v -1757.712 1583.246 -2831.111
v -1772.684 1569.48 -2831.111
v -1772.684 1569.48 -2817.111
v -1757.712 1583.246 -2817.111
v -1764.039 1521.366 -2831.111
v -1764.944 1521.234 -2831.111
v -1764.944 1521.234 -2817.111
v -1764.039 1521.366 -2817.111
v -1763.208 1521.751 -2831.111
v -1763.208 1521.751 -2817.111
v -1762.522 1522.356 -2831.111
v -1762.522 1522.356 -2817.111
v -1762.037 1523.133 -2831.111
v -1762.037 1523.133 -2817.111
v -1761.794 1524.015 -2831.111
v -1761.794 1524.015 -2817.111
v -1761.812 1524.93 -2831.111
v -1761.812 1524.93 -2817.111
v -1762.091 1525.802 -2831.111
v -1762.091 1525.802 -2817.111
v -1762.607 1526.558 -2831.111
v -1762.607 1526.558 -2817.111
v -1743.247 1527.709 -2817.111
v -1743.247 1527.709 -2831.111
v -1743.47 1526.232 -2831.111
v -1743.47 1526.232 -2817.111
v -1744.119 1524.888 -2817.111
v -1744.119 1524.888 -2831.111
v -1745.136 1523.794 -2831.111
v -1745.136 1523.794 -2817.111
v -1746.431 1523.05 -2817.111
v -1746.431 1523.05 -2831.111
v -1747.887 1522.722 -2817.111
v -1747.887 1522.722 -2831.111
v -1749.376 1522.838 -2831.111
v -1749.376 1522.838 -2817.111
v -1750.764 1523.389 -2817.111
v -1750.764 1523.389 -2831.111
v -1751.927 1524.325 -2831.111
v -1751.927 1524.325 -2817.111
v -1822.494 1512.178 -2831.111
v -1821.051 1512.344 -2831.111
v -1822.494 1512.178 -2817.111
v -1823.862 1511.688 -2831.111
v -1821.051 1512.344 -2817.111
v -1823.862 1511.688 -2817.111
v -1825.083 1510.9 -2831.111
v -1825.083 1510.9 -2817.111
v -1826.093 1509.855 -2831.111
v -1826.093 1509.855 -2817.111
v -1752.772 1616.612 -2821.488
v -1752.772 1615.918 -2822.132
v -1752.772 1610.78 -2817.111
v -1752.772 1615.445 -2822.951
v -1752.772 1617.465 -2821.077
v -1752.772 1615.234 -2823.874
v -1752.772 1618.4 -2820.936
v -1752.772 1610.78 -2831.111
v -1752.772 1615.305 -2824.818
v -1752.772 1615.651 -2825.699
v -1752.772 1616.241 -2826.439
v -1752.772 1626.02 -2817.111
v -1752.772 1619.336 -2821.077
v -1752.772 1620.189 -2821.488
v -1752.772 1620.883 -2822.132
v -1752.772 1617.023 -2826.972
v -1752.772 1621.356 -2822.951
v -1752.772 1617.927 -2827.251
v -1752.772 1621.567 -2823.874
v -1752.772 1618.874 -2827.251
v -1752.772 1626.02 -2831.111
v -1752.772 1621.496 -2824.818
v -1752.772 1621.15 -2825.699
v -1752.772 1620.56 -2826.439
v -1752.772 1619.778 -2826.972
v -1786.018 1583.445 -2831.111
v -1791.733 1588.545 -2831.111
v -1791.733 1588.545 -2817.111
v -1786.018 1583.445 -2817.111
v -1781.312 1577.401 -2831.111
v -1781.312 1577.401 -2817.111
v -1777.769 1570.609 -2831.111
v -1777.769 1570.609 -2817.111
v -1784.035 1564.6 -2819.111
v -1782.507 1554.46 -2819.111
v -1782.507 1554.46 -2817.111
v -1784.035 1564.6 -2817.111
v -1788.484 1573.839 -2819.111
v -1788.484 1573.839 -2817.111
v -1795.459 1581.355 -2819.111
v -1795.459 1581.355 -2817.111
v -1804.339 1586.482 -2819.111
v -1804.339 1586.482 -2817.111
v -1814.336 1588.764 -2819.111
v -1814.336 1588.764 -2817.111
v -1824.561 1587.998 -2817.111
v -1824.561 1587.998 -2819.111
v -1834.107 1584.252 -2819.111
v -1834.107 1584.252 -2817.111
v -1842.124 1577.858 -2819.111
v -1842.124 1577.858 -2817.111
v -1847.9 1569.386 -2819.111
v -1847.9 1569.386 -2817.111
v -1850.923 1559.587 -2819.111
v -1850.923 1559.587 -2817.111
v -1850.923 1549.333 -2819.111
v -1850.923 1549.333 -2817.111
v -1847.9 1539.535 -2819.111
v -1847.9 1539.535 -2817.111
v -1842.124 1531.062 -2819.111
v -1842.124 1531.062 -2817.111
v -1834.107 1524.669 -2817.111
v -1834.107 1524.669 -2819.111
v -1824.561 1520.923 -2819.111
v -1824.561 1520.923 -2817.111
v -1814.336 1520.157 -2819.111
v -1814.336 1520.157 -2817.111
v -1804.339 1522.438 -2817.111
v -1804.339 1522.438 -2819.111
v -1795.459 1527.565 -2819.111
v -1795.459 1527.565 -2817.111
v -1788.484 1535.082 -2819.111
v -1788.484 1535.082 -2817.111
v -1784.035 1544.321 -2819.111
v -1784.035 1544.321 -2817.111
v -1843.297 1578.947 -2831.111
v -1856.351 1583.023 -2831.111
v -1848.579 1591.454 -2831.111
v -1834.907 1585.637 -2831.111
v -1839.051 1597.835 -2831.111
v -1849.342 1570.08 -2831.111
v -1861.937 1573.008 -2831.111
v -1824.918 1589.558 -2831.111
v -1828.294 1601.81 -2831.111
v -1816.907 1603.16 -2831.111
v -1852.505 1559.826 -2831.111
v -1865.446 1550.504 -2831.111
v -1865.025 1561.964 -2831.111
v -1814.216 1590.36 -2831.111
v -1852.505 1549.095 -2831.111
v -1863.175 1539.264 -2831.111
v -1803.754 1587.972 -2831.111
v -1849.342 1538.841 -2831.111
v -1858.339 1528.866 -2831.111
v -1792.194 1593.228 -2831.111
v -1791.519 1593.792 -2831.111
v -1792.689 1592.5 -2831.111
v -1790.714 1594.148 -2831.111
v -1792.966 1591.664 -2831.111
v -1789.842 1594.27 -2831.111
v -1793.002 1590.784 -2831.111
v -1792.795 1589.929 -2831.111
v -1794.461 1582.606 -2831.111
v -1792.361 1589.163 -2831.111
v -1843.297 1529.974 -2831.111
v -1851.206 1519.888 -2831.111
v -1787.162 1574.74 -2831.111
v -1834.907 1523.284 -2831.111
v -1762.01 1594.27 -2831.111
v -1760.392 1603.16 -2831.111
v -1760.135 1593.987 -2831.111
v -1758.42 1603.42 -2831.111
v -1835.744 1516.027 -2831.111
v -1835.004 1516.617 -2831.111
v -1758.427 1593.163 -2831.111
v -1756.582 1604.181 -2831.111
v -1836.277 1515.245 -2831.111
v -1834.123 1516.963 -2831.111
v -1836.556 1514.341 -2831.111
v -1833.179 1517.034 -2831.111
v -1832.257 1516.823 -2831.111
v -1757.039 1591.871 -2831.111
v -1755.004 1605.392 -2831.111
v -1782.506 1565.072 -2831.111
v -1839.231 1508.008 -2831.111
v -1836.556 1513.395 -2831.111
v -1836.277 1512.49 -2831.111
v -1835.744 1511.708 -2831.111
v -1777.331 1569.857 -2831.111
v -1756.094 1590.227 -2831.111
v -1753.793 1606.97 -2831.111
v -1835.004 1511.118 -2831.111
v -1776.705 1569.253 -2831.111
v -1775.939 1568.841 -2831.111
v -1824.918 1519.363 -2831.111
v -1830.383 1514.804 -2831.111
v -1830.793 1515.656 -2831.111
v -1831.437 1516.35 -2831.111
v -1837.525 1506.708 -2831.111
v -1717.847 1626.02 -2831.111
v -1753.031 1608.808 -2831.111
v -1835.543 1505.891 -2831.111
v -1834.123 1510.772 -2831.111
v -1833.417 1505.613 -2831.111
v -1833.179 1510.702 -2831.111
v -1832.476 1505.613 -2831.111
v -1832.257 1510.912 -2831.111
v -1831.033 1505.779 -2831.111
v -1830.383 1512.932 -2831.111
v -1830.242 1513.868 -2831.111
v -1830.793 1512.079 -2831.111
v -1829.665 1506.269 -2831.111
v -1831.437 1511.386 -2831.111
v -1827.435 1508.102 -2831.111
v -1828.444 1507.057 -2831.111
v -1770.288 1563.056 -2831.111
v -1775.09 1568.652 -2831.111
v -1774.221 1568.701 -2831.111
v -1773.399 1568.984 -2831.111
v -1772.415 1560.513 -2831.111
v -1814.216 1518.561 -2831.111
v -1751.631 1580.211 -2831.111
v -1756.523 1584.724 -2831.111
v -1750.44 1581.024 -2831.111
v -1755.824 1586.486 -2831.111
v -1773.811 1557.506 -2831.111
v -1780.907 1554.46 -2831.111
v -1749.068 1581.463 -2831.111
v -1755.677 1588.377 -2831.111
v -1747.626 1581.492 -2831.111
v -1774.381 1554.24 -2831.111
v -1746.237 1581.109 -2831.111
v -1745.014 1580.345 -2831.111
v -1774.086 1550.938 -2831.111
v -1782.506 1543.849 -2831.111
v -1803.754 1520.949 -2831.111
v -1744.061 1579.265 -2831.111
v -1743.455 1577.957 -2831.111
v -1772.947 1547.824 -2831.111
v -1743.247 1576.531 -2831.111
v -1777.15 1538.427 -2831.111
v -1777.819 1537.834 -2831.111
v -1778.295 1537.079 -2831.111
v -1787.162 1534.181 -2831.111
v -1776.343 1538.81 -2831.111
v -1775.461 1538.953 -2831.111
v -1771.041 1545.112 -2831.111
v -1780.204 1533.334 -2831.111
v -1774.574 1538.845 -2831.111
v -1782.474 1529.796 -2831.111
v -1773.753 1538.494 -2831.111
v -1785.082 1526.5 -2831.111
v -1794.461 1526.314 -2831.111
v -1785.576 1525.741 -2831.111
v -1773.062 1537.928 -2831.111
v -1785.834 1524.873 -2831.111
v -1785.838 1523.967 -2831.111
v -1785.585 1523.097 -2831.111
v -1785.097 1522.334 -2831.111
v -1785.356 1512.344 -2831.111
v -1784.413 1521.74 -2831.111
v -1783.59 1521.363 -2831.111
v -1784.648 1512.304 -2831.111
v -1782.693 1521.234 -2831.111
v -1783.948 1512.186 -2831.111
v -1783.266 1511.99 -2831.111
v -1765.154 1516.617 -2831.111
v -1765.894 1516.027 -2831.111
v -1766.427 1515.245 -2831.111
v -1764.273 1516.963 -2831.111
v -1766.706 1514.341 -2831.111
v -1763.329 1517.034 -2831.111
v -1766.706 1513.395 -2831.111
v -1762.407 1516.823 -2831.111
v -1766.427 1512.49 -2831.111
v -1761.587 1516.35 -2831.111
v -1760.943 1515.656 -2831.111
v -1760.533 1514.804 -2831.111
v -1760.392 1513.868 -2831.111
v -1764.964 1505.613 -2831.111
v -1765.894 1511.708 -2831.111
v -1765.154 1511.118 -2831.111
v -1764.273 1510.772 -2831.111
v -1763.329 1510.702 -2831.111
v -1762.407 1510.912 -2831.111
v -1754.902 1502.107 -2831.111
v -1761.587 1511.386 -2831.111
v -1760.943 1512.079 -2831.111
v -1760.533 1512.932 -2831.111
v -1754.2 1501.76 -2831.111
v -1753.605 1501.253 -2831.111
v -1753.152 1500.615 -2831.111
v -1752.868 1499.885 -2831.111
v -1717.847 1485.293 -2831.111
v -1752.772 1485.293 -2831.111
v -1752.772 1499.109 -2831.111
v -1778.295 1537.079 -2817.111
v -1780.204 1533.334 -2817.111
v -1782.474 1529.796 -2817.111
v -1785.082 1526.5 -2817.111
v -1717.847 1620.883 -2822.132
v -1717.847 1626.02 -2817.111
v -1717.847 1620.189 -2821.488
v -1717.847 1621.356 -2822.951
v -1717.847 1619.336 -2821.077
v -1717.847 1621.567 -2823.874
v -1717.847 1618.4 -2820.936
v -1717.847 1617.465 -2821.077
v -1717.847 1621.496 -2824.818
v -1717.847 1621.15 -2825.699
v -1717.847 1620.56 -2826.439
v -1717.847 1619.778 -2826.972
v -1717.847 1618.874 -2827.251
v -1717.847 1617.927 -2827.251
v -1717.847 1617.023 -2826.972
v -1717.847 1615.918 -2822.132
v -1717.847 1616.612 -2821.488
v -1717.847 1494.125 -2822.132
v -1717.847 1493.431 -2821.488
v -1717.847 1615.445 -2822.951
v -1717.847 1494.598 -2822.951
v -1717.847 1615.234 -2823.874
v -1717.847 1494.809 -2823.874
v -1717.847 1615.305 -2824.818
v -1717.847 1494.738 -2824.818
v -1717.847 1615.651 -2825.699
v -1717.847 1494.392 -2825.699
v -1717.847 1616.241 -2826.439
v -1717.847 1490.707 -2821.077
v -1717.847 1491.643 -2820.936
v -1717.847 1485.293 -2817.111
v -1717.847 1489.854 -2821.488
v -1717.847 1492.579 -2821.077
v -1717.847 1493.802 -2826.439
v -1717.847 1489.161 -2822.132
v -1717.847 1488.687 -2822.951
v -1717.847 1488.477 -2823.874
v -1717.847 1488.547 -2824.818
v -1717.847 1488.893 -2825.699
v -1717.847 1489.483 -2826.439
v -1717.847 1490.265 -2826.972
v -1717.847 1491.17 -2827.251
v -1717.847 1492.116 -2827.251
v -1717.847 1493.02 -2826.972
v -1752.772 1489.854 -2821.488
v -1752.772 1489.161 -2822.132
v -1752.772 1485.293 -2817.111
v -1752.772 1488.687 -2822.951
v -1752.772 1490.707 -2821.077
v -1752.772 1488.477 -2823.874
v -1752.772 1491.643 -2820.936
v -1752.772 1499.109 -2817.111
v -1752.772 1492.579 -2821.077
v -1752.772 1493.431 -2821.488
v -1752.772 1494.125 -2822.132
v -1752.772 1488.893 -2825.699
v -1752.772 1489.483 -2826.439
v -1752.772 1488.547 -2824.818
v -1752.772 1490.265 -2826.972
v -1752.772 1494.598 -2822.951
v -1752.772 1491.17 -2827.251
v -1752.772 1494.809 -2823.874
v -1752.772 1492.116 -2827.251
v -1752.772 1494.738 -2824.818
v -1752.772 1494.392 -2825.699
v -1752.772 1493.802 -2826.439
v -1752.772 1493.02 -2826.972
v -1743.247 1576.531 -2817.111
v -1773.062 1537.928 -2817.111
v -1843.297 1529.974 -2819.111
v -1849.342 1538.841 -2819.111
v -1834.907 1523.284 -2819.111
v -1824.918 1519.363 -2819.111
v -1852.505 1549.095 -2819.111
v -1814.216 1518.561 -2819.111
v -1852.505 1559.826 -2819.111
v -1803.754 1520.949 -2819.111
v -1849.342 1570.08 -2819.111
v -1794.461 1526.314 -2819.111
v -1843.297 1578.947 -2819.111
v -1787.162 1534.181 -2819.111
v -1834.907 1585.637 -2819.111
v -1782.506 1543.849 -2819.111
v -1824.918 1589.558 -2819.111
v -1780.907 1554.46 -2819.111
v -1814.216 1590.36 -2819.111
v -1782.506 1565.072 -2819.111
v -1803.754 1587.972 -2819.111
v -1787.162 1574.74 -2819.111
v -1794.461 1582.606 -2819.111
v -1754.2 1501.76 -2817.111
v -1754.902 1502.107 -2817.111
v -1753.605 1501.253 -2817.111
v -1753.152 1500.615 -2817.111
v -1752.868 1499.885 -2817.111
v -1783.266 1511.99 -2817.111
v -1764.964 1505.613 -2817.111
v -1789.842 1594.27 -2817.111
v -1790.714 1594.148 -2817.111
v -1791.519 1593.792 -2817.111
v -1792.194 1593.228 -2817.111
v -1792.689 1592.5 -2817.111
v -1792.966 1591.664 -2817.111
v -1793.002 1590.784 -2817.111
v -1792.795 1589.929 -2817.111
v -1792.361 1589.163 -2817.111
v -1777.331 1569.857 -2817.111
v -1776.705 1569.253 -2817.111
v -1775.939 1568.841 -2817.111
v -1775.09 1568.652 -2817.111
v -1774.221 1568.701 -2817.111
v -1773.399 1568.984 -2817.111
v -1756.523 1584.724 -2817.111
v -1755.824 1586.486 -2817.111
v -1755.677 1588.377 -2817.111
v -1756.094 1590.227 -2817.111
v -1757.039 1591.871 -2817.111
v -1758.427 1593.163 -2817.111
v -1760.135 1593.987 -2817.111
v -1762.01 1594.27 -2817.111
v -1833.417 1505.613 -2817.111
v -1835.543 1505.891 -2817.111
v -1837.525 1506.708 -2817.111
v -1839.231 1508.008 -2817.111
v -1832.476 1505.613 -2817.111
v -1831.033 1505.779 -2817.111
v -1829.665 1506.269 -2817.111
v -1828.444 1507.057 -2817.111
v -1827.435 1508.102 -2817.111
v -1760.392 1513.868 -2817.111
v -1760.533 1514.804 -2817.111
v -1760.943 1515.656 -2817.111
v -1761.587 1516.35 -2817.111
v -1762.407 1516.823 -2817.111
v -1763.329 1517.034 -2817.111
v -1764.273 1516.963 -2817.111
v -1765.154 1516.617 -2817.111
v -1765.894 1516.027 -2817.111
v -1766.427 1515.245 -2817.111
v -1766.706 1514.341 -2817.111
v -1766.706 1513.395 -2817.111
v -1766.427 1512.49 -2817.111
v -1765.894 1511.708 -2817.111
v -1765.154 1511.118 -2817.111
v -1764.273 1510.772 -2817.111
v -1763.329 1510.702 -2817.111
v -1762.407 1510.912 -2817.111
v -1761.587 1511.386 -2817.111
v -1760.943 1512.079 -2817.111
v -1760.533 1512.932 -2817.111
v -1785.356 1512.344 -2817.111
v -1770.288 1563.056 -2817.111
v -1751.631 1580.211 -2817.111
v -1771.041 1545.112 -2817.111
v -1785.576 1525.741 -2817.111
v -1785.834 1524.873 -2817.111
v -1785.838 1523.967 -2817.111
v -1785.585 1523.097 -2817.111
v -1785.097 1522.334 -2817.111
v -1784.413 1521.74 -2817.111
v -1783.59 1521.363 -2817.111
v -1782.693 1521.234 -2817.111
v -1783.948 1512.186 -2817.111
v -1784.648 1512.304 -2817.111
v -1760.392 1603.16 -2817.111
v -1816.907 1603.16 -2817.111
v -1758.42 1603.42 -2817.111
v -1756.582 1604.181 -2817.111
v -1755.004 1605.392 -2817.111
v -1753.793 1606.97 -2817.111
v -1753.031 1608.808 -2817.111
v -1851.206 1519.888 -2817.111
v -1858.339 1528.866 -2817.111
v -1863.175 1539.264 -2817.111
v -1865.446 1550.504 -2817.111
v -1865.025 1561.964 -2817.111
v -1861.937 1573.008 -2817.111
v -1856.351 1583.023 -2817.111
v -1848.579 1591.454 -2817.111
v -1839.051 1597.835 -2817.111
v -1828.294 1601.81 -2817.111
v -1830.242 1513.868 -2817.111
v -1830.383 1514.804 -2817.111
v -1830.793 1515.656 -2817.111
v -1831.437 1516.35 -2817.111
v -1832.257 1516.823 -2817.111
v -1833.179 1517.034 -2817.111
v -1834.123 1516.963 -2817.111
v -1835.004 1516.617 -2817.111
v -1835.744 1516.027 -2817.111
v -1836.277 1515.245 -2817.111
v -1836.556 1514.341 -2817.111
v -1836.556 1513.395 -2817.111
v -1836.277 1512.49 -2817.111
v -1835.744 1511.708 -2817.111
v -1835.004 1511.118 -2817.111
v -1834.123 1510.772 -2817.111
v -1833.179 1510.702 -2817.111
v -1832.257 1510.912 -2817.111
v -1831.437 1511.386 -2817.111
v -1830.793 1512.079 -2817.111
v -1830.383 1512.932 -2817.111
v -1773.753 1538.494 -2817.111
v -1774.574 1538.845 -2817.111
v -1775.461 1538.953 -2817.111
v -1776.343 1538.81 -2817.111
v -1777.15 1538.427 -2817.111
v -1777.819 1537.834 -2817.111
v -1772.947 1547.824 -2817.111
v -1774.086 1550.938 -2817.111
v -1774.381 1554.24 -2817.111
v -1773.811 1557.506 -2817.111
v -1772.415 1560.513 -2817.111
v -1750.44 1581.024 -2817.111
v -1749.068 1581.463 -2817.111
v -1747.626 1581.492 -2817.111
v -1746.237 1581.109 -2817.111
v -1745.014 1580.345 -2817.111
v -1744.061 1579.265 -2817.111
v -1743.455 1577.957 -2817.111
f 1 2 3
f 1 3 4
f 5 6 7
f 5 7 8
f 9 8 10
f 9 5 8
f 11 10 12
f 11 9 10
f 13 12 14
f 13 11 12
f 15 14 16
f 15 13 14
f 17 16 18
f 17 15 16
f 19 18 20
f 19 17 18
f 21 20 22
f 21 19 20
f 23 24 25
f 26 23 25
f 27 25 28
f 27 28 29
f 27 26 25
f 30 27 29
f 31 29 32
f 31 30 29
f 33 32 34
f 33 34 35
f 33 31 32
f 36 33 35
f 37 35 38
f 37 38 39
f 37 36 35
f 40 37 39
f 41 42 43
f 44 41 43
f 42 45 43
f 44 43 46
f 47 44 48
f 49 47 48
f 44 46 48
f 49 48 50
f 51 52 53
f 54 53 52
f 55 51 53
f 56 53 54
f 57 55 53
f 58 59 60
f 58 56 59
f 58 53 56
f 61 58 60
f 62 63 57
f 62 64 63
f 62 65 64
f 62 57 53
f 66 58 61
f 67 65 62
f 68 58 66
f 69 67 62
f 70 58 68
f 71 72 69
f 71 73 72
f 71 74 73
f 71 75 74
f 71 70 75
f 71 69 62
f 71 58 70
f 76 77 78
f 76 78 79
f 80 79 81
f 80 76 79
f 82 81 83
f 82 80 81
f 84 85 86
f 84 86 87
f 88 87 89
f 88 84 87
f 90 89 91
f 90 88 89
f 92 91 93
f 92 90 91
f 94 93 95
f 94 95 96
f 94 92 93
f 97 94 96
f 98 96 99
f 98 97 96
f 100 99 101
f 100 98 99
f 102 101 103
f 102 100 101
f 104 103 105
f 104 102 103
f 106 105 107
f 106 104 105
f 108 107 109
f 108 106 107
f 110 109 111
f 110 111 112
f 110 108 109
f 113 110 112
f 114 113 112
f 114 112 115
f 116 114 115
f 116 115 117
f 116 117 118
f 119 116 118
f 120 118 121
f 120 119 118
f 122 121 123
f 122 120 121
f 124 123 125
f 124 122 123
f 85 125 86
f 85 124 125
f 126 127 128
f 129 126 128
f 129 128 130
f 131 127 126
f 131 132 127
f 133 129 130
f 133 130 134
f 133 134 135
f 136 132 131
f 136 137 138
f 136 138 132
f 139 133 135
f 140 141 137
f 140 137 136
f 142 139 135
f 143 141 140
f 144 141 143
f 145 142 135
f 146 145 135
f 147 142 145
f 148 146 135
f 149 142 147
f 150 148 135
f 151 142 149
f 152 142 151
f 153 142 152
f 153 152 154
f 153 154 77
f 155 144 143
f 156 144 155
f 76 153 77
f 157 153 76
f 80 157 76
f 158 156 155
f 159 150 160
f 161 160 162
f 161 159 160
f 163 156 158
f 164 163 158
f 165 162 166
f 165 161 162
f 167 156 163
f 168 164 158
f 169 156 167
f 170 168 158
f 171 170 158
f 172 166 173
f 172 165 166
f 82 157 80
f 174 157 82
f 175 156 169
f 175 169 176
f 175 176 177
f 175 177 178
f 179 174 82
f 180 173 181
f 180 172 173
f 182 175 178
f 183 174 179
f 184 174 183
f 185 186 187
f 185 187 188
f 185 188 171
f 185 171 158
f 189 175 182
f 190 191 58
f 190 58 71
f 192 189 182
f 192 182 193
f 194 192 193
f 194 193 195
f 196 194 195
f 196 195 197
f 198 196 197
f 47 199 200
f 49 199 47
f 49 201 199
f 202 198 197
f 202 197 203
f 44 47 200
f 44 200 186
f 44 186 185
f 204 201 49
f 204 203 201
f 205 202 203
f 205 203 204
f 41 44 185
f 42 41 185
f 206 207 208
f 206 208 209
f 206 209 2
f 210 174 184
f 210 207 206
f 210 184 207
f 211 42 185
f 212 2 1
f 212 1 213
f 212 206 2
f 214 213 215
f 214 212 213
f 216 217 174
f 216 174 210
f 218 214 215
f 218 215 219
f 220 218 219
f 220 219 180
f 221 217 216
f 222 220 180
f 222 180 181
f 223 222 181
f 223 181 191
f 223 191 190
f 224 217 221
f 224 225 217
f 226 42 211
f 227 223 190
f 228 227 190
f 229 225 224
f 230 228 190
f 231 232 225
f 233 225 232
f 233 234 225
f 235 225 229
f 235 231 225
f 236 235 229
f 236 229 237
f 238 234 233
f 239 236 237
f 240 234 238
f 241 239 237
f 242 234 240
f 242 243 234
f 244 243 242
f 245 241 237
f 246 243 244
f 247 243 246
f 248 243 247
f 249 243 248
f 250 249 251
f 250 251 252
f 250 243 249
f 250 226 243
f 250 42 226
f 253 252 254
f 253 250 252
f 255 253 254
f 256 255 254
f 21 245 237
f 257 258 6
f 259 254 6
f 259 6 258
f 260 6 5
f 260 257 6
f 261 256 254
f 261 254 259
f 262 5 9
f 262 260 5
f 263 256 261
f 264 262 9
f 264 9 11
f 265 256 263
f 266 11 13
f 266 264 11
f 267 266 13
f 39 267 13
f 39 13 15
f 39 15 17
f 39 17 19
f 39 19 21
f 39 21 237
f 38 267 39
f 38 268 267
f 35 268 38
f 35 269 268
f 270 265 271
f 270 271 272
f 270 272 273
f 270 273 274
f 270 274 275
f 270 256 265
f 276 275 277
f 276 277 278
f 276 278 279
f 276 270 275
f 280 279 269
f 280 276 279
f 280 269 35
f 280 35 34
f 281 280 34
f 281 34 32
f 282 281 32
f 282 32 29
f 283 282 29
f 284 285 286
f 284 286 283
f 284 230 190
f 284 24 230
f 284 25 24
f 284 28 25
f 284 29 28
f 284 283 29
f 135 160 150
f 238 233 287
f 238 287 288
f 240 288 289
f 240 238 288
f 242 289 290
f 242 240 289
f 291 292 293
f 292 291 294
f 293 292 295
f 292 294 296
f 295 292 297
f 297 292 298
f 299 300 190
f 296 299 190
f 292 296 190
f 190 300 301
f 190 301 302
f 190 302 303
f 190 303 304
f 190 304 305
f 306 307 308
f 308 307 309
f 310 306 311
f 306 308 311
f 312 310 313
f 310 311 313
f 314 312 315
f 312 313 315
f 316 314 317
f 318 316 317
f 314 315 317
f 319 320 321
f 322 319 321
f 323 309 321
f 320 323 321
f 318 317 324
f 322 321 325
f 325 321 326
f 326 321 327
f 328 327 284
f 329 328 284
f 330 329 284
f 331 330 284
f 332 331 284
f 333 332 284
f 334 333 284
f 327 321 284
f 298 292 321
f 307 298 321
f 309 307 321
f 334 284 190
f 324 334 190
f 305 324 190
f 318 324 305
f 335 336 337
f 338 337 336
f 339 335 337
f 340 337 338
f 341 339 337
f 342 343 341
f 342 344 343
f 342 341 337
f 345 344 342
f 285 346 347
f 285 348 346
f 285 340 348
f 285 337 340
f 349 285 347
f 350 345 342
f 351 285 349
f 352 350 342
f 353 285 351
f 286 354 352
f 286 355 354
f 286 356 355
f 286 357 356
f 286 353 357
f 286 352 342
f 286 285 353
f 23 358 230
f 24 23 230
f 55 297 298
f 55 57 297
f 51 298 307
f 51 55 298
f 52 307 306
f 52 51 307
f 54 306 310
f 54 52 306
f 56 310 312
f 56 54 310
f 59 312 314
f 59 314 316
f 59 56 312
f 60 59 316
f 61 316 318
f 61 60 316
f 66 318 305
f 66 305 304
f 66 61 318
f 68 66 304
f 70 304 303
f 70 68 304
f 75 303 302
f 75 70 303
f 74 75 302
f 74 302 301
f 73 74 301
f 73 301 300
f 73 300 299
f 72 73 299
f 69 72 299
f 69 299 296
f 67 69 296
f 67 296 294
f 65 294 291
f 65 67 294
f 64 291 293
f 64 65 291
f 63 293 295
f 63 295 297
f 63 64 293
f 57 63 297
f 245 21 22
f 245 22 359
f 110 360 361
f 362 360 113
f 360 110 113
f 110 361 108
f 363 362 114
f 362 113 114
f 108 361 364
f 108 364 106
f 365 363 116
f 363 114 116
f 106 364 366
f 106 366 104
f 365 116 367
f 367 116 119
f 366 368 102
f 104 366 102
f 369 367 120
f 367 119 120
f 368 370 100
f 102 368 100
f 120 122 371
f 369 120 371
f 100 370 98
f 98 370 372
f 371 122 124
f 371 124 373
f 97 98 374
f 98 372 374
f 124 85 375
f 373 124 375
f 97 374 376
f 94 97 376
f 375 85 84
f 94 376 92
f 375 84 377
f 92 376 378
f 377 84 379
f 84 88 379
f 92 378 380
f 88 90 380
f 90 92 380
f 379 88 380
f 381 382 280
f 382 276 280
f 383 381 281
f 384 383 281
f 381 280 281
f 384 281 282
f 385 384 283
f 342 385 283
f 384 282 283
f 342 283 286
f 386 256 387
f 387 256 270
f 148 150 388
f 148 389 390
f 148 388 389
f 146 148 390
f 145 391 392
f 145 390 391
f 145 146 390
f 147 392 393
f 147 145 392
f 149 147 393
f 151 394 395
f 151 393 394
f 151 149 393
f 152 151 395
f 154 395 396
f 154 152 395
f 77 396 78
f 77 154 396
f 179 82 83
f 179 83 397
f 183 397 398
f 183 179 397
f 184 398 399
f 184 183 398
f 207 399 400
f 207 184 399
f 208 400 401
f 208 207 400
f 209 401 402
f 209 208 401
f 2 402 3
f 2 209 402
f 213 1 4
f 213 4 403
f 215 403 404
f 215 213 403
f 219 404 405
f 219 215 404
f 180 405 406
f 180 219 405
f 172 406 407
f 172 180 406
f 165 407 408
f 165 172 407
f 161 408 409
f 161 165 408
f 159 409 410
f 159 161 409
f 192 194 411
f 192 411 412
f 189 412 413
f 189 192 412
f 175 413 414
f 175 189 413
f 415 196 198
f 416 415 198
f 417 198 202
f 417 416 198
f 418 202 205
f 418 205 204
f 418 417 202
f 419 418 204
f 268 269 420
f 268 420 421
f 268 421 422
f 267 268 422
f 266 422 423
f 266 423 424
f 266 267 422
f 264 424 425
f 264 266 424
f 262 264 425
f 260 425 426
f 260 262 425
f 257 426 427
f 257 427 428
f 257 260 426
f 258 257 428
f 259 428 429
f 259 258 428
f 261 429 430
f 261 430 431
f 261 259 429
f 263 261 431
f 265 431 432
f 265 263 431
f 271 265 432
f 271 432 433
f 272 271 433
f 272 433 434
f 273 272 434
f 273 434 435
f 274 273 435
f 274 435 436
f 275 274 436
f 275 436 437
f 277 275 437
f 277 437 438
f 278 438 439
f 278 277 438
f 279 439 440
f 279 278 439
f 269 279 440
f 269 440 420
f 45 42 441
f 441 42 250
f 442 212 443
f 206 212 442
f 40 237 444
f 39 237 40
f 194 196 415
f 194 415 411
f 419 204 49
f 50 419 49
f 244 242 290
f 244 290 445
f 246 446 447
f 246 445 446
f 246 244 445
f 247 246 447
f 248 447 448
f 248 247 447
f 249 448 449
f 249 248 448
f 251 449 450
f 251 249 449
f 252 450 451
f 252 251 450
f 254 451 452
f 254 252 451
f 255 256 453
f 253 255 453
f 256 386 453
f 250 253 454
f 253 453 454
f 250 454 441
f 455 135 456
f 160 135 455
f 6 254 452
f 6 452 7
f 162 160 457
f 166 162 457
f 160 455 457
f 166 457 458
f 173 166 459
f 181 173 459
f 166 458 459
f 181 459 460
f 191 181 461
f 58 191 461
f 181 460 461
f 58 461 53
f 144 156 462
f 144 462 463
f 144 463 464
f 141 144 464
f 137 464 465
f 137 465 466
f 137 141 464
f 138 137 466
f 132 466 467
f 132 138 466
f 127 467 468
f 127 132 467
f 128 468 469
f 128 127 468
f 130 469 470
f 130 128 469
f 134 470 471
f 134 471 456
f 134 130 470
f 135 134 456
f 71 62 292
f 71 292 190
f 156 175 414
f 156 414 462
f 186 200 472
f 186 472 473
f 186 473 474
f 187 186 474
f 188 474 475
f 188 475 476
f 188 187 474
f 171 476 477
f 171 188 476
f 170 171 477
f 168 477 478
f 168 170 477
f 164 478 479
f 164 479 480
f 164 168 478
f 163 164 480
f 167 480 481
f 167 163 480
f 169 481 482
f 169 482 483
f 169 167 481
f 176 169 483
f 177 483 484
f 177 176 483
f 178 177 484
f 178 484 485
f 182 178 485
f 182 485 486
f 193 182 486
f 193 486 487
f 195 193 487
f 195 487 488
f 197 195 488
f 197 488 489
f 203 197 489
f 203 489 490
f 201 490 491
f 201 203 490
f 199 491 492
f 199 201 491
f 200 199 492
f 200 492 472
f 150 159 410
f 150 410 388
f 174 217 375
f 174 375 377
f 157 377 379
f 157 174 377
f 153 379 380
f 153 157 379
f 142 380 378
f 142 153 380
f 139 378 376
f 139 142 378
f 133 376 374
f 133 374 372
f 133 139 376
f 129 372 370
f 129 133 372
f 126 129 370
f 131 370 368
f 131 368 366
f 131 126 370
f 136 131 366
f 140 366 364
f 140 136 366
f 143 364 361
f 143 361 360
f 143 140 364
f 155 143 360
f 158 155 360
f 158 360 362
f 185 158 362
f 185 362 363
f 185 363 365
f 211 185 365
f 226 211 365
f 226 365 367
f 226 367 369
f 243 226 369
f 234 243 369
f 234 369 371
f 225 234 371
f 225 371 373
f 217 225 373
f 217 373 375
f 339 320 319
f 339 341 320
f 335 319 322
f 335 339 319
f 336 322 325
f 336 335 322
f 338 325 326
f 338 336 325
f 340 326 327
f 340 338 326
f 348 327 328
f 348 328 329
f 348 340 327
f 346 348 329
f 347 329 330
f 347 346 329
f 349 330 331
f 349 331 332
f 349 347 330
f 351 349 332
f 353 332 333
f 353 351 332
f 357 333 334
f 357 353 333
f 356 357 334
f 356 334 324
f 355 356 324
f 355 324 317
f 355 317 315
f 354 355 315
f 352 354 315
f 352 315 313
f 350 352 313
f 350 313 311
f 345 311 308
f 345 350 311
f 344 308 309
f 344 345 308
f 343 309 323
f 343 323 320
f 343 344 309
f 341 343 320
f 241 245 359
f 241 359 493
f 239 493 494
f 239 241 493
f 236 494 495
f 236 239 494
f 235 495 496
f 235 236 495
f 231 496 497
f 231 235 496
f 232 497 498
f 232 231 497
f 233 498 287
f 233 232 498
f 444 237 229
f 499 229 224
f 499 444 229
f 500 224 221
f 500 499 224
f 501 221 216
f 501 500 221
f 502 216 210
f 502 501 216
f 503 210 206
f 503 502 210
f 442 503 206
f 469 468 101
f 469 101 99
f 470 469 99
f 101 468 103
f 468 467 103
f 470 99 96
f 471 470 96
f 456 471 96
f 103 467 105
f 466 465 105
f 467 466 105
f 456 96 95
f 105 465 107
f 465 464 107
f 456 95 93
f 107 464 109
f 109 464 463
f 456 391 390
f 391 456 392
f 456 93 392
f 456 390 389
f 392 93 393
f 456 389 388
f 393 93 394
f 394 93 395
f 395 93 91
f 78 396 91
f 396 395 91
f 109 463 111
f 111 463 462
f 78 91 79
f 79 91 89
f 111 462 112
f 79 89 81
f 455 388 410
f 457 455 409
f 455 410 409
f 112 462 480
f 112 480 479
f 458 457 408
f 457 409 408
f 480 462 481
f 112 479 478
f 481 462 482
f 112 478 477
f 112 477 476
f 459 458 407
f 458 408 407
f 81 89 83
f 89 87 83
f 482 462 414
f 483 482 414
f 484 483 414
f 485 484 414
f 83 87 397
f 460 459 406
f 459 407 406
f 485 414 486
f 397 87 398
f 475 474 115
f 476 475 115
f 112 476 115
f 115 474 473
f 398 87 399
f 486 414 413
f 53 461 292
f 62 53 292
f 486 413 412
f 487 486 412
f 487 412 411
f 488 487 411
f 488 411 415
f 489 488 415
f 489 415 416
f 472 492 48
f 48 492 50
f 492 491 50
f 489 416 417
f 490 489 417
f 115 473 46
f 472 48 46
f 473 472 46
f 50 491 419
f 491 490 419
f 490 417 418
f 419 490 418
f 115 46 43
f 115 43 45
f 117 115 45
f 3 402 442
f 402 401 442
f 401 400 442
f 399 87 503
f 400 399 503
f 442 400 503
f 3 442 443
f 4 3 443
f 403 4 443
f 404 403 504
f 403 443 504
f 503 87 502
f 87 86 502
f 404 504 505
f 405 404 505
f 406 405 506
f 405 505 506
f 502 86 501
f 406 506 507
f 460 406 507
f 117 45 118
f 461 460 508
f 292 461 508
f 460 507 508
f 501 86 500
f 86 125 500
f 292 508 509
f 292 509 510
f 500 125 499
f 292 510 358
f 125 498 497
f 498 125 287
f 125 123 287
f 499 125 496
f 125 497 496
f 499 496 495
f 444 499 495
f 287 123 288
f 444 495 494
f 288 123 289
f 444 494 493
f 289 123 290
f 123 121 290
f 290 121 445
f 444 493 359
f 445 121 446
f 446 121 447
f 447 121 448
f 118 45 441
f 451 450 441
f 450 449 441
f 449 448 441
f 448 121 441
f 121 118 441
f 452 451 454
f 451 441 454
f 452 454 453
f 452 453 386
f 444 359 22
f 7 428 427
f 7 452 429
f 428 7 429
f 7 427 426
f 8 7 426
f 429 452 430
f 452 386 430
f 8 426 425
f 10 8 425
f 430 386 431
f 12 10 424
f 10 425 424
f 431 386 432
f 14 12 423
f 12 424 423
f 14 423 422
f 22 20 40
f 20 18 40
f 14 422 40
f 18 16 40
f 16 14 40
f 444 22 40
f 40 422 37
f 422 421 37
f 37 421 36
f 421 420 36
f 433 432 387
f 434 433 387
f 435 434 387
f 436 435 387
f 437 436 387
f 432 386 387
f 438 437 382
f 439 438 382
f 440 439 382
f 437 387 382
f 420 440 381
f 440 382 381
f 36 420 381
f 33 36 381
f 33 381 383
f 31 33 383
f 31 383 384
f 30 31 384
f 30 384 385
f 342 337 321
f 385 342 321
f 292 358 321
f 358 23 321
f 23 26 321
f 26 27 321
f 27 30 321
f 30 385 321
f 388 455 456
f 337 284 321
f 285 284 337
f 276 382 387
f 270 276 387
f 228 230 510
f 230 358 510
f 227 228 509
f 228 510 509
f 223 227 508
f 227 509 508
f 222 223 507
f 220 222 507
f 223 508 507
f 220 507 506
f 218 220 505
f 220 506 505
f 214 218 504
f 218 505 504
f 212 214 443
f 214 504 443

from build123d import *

# Parameters (mm, degrees)
BOSS_EXTRUDE1_DEPTH      = 8
BOSS_EXTRUDE1_DEPTH_BACK = 6
SKETCH1_R                = 36
SKETCH1_R_2              = 3.175
BOSS_EXTRUDE2_START      = -2
SKETCH3_R                = 36
SKETCH3_R_2              = 34.4
BOSS_EXTRUDE2_DEPTH      = 2
SKETCH4_R                = 3.175
CUT_EXTRUDE1_DEPTH       = 3267.782082753
FILLET11_R               = 12.7
CUT_EXTRUDE2_DEPTH       = 22.352
FILLET13_R               = 7.62
BOSS_EXTRUDE5_DEPTH      = 14
FILLET16_R               = 6.35
FILLET17_R               = 3.175
SKETCH10_W               = 14
SKETCH10_H               = 38.1
SKETCH10_R               = 3.175
SKETCH10_H_2             = 29.591
BOSS_EXTRUDE6_DEPTH      = 25.4
BOSS_EXTRUDE7_REACH      = 3394.349
SKETCH11_W               = 25.4
SKETCH11_H               = 14
FILLET18_R               = 5


with BuildPart() as part:
    # Sketch1 → Boss-Extrude1 (new, two sides: drawn at the far end of the back side and taken through both)
    with BuildSketch(Plane(origin=(-1819.591456758, 1585.913991712, -2825.111273399), x_dir=(1, 0, 0), z_dir=(0, 0, 1)).offset(-BOSS_EXTRUDE1_DEPTH_BACK)):
        with BuildLine():
            Line((2.684706364, 17.24642532), (66.819706364, 17.24642532))
            Line((66.819706364, 17.24642532), (66.819706364, 40.10642532))
            Line((66.819706364, 40.10642532), (76.344706364, 40.10642532))
            Line((76.344706364, 40.10642532), (76.344706364, 2.00642532))
            Line((76.344706364, 2.00642532), (39.954706364, -31.45357468))
            Line((39.954706364, -31.45357468), (76.344706364, -71.030146707))
            Line((76.344706364, -71.030146707), (76.344706364, -100.621146707))
            Line((76.344706364, -100.621146707), (66.819706364, -100.621146707))
            Line((66.819706364, -100.621146707), (66.819706364, -80.301146707))
            Line((66.819706364, -80.301146707), (-13.825293636, -80.301146707))
            ThreePointArc((-13.825293636, -80.301146707), (-16.969178238, -79.679037025), (-19.63920674, -77.906474293))
            Line((-19.63920674, -77.906474293), (-31.614211644, -66.026312835))
            ThreePointArc((-31.614211644, -66.026312835), (-42.345185642, -12.90636934), (2.684706364, 17.24642532))
        make_face()
        with Locations((2.684706364, -31.45357468)):
            Circle(SKETCH1_R, mode=Mode.SUBTRACT)
        with Locations((56.024706364, -72.046146707)):
            Circle(SKETCH1_R_2, mode=Mode.SUBTRACT)
        with Locations((-13.825293636, -72.046146707)):
            Circle(SKETCH1_R_2, mode=Mode.SUBTRACT)
    extrude(amount=BOSS_EXTRUDE1_DEPTH + BOSS_EXTRUDE1_DEPTH_BACK)

    # Sketch3 → Boss-Extrude2 (add)
    with BuildSketch(Plane.XY.offset(-2817.111273399).offset(BOSS_EXTRUDE2_START)):
        with Locations((-1816.906750395, 1554.460417032)):
            Circle(SKETCH3_R)
        with Locations((-1816.906750395, 1554.460417032)):
            Circle(SKETCH3_R_2, mode=Mode.SUBTRACT)
    extrude(amount=BOSS_EXTRUDE2_DEPTH)

    # Sketch4 → Cut-Extrude1 (cut, through all)
    with BuildSketch(Plane.ZY.offset(1752.771750395)):
        with Locations((-2824.111273399, 1618.400417032)):
            Circle(SKETCH4_R)
        with Locations((-2824.111273399, 1491.642845005)):
            Circle(SKETCH4_R)
    extrude(amount=-CUT_EXTRUDE1_DEPTH, mode=Mode.SUBTRACT)

    # Fillet11
    fillet11_edges = [part.edges().sort_by_distance(p)[0] for p in [
        (-1779.636750395, 1554.460417032, -2824.111273399),
    ]]
    fillet(fillet11_edges, radius=FILLET11_R)

    # Sketch6 → Cut-Extrude2 (cut)
    with BuildSketch(Plane(origin=(0, 0, -2831.111273399), x_dir=(-1, 0, 0), z_dir=(0, 0, -1))):
        with BuildLine():
            Line((1772.683835409, 1569.479812149), (1757.712123838, 1583.246052027))
            ThreePointArc((1757.712123838, 1583.246052027), (1756.093845604, 1590.22696014), (1762.010124746, 1594.270417032))
            Line((1762.010124746, 1594.270417032), (1789.841933512, 1594.270417032))
            ThreePointArc((1789.841933512, 1594.270417032), (1792.856665482, 1592.091417106), (1791.733381238, 1588.545309093))
            ThreePointArc((1791.733381238, 1588.545309093), (1783.527991751, 1580.529266005), (1777.768914276, 1570.608661686))
            ThreePointArc((1777.768914276, 1570.608661686), (1775.52091162, 1568.717450047), (1772.683835409, 1569.479812149))
        make_face()
        with BuildLine():
            Line((1782.693449915, 1521.233845005), (1764.944287612, 1521.233845005))
            ThreePointArc((1764.944287612, 1521.233845005), (1762.037080925, 1523.132610591), (1762.60710511, 1526.557845459))
            Line((1762.60710511, 1526.557845459), (1773.061547126, 1537.927754155))
            ThreePointArc((1773.061547126, 1537.927754155), (1775.907154759, 1538.912781284), (1778.29542193, 1537.07867628))
            ThreePointArc((1778.29542193, 1537.07867628), (1781.295178562, 1531.536772561), (1785.082430904, 1526.500111328))
            ThreePointArc((1785.082430904, 1526.500111328), (1785.584850577, 1523.097194437), (1782.693449915, 1521.233845005))
        make_face()
        Polygon((1824.186318893, 1512.343845005), (1784.281249696, 1512.343845005), (1764.963750395, 1505.612845005), (1752.771750395, 1505.612845005), (1752.771750395, 1485.292845005), (1829.340879649, 1505.612845005), align=None)
    extrude(amount=-CUT_EXTRUDE2_DEPTH, mode=Mode.SUBTRACT)

    # Fillet13
    fillet13_edges = [part.edges().sort_by_distance(p)[0] for p in [
        (-1752.771750395, 1603.160417032, -2824.111273399),
    ]]
    fillet(fillet13_edges, radius=FILLET13_R)

    # Sketch9 → Boss-Extrude5 (add)
    with BuildSketch(Plane.XY.offset(-2817.111273399)):
        Polygon((-1764.963750395, 1505.612845005), (-1752.771750395, 1505.612845005), (-1752.771750395, 1501.364657871), align=None)
    extrude(amount=-BOSS_EXTRUDE5_DEPTH)

    # Fillet16
    fillet16_edges = [part.edges().sort_by_distance(p)[0] for p in [
        (-1824.186318893, 1512.343845005, -2824.111273399),
        (-1829.340879649, 1505.612845005, -2824.111273399),
        (-1784.281249696, 1512.343845005, -2824.111273399),
    ]]
    fillet(fillet16_edges, radius=FILLET16_R)

    # Fillet17
    fillet17_edges = [part.edges().sort_by_distance(p)[0] for p in [
        (-1752.771750395, 1501.364657871, -2824.111273399),
    ]]
    fillet(fillet17_edges, radius=FILLET17_R)

    # Sketch10 → Boss-Extrude6 (add)
    # profile 1 of 2: a face of its own
    with BuildSketch(Plane(origin=(-1743.246750395, 0, 0), x_dir=(0, 0, -1), z_dir=(1, 0, 0))):
        with Locations((2824.111273399, 1606.970417032)):
            Rectangle(SKETCH10_W, SKETCH10_H)
        with Locations(Location((2824.111273399, 1618.400417032, 0), (0, 0, 180))):
            Circle(SKETCH10_R, mode=Mode.SUBTRACT)
    # profile 2 of 2: a face of its own
    with BuildSketch(Plane(origin=(-1743.246750395, 0, 0), x_dir=(0, 0, -1), z_dir=(1, 0, 0))):
        with Locations((2824.111273399, 1500.088345005)):
            Rectangle(SKETCH10_W, SKETCH10_H_2)
        with Locations(Location((2824.111273399, 1491.642845005, 0), (0, 0, 180))):
            Circle(SKETCH10_R, mode=Mode.SUBTRACT)
    extrude(amount=BOSS_EXTRUDE6_DEPTH)

    # Boss-Extrude7: up to this plane
    boss_extrude7_end = Plane(origin=(-1743.246750395, 1587.920417032, -2831.111273399), z_dir=(0.6768505367088385, -0.7361204731271623, 0))
    # Sketch11 → Boss-Extrude7 (add, up to the surface)
    with BuildSketch(Plane(origin=(0, 1514.883845005, 0), x_dir=(1, 0, 0), z_dir=(0, 1, 0)), mode=Mode.PRIVATE) as boss_extrude7_sk1:
        with Locations((-1730.546750395, 2824.111273399)):
            Rectangle(SKETCH11_W, SKETCH11_H)
    boss_extrude7_tool1 = split(extrude(boss_extrude7_sk1.sketch, amount=BOSS_EXTRUDE7_REACH, mode=Mode.PRIVATE), bisect_by=boss_extrude7_end, keep=Keep.BOTH, mode=Mode.PRIVATE)
    add(boss_extrude7_tool1.solids().sort_by_distance((-1730.54675, 1514.883845, -2824.111273))[0])

    # Fillet18
    fillet18_edges = [part.edges().sort_by_distance(p)[0] for p in [
        (-1743.246750395, 1587.920417032, -2824.111273399),
        (-1743.246750395, 1514.883845005, -2824.111273399),
    ]]
    fillet(fillet18_edges, radius=FILLET18_R)


solid = part.part
